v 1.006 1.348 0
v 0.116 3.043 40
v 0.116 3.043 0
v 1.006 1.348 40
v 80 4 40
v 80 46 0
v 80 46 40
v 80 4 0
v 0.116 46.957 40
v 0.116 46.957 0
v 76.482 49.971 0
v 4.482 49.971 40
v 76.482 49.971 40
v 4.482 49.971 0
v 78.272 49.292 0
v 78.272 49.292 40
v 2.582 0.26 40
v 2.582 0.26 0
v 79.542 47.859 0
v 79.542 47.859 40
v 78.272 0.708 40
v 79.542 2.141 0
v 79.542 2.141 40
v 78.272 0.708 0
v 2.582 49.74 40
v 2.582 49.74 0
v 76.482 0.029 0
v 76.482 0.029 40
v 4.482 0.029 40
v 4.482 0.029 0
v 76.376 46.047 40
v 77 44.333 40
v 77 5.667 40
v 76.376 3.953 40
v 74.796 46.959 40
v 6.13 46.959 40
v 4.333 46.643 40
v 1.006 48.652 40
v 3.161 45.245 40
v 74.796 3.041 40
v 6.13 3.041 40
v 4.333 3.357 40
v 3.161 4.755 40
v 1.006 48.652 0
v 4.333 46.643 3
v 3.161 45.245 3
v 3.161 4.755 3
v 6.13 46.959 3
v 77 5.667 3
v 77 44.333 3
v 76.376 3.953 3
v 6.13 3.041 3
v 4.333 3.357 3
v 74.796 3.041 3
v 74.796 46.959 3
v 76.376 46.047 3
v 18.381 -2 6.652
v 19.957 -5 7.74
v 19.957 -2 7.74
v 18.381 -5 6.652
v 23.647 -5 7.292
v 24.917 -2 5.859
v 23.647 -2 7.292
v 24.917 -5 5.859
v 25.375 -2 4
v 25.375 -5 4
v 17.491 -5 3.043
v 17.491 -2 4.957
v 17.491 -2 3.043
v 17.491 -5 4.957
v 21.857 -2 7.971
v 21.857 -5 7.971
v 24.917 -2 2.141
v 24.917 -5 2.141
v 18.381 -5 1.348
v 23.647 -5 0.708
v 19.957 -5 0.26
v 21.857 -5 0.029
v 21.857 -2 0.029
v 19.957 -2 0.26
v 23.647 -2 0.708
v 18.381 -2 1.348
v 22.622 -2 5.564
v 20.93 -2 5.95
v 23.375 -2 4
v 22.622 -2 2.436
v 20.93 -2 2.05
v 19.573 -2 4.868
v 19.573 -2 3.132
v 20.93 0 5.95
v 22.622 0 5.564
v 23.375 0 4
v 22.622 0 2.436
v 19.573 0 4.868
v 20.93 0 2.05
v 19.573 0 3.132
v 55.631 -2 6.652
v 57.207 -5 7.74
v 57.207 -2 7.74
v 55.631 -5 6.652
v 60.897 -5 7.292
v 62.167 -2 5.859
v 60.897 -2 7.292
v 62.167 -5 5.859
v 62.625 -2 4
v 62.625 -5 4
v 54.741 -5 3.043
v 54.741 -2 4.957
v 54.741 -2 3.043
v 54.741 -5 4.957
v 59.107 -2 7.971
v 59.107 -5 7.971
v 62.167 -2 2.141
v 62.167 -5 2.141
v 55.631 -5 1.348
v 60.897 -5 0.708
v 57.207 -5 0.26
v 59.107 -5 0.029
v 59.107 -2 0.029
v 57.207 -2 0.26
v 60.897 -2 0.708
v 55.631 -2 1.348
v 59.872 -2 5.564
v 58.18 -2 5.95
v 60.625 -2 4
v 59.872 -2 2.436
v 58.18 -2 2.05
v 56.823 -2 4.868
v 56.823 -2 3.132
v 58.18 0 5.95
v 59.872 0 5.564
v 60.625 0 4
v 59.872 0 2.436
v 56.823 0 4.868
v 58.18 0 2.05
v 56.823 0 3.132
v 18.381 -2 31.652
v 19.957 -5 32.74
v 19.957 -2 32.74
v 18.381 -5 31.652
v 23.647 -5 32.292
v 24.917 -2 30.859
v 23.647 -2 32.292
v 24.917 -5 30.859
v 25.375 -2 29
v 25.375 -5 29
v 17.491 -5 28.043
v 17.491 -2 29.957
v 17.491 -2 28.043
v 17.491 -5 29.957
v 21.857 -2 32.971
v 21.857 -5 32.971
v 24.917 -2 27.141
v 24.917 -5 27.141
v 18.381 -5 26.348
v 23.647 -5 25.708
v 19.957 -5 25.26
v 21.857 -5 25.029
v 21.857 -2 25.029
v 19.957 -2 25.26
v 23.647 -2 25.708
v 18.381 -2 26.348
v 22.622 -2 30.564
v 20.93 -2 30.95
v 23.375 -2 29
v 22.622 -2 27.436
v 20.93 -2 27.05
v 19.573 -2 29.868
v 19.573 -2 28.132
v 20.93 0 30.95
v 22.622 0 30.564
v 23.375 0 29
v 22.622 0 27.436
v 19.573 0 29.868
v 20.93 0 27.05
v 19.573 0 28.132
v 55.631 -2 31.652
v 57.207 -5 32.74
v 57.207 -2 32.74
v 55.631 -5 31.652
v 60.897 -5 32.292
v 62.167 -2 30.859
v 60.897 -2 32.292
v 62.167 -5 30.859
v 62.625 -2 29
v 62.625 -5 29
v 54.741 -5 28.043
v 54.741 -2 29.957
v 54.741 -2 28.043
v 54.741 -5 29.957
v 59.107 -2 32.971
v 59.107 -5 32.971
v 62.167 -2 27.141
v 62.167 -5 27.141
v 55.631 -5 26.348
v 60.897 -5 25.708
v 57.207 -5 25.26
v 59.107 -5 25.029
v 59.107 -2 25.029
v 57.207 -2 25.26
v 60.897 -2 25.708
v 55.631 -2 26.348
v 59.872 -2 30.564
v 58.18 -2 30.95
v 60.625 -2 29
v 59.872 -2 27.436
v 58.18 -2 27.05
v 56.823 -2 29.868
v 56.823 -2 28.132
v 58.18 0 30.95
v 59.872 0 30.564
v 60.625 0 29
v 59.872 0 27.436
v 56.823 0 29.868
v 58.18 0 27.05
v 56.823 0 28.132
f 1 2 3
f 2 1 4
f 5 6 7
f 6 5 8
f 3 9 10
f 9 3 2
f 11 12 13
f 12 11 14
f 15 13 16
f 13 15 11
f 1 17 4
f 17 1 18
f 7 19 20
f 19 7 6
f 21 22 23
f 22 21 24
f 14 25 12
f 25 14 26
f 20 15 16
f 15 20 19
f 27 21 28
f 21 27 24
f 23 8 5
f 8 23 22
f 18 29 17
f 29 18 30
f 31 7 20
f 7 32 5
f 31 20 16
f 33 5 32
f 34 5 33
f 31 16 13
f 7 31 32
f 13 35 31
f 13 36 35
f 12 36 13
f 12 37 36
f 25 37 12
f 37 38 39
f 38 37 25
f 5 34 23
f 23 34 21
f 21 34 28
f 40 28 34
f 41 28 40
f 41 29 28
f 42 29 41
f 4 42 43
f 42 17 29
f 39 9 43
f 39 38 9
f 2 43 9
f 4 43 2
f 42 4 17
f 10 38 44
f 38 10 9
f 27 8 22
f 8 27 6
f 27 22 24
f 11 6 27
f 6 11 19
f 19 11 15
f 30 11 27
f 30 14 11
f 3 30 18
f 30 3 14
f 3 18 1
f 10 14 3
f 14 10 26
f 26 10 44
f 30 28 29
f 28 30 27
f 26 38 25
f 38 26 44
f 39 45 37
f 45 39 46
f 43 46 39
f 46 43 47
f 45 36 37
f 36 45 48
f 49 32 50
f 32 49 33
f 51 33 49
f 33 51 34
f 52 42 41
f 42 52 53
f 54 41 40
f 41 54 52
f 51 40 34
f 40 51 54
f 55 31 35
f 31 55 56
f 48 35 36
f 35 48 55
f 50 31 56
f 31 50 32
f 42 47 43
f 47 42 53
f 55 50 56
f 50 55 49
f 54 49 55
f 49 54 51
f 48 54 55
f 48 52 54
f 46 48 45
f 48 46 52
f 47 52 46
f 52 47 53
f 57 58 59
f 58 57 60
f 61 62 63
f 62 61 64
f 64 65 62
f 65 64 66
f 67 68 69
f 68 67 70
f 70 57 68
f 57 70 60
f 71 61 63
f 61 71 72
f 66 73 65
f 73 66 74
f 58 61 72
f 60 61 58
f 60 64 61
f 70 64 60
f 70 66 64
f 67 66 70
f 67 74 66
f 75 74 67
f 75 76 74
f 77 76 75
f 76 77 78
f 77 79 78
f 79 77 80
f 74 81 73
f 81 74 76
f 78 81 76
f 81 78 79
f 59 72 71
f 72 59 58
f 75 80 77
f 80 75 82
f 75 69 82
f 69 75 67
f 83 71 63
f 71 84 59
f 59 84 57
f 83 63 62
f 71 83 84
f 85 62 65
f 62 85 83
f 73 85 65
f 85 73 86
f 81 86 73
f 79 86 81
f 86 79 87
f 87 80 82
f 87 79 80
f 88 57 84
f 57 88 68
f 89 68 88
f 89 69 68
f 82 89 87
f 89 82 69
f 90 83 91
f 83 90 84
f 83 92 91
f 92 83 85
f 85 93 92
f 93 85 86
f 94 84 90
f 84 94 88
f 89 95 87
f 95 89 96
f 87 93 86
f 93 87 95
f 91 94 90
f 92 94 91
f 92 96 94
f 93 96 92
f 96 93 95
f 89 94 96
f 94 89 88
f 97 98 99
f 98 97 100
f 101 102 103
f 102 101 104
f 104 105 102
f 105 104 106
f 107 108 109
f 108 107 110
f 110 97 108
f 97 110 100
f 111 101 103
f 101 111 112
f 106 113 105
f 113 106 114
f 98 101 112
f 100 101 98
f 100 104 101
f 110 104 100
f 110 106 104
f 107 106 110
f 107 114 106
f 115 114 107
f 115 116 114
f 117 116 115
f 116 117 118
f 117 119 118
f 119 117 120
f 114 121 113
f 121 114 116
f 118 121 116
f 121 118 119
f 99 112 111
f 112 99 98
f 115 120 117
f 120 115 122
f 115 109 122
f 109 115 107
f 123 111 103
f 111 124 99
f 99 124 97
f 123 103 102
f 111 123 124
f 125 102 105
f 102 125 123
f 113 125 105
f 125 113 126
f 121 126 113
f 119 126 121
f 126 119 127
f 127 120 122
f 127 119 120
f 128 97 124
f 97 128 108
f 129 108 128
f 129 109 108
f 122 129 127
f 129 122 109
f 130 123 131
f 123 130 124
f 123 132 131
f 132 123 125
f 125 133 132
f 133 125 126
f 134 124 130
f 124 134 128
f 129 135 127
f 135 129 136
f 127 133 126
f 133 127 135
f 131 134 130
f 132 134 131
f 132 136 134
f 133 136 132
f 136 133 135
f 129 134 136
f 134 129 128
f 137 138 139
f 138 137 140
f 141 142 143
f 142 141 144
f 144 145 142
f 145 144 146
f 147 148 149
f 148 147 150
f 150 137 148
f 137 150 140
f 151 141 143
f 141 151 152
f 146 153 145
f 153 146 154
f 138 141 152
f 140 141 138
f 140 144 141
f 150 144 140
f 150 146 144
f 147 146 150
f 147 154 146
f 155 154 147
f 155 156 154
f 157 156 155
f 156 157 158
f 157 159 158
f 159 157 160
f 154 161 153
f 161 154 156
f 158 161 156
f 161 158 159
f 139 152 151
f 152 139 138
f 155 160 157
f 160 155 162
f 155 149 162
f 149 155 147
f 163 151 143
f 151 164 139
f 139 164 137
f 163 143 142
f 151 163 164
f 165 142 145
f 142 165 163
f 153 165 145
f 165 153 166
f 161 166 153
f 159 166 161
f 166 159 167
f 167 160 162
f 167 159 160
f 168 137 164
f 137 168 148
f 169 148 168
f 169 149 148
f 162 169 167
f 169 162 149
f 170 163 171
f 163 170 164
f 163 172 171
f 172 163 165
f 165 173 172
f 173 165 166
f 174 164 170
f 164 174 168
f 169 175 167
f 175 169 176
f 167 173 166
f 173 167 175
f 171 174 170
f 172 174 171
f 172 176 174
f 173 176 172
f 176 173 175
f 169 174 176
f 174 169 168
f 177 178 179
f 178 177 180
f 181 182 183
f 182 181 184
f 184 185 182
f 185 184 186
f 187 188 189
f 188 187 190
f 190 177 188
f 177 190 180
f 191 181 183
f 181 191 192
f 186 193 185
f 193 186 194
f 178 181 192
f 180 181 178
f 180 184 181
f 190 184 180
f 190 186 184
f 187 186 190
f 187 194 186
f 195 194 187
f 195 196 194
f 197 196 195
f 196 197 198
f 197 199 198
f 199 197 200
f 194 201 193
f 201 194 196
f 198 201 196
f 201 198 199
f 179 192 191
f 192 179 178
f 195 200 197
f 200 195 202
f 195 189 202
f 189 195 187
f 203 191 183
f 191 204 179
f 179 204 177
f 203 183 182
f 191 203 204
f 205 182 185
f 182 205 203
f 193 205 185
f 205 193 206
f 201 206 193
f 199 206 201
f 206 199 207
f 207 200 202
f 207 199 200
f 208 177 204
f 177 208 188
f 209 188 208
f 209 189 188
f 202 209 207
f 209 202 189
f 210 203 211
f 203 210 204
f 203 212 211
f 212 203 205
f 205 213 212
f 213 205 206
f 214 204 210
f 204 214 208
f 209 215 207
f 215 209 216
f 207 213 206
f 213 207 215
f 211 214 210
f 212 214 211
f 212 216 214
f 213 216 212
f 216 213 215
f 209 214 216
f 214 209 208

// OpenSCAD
// file: modules/module_pegs.scad
module pegs_lux(width,rows)
{
    dia_knob    = 8;
    len_knob    = 3;
    dia_pin     = 4;
    wall        = 2;
    dist        = 37;
    height      = 25;
    
    pegs(dist,height,wall,dia_knob,len_knob,dia_pin,rows);
}

module pegs_hornbach(width,rows)
{
    dia_knob    = 8;
    len_knob    = 3;
    dia_pin     = 4;
    wall        = 2;
    dist        = 45;
    height      = 45;
    
    pegs(dist,height,wall,dia_knob,len_knob,dia_pin);
}

module pegs(dist,height,wall,dia_knob,len_knob,dia_pin,rows)
{
    for(off_y=[0:height:(rows-1)*height])
    {
        translate([dia_knob/2,0,off_y+dia_knob/2])
        {
            for(i=[0:dist:width-dia_knob])
            {
                translate([i+((width-dia_knob)%dist)/2,0,0])
                {
                    peg(wall,dia_knob,len_knob,dia_pin);
                }
            }
        }
    }
}

module peg(wall,dia_knob,len_knob,dia_pin)
{
    rotate([90,0,0])
    {
        translate([0,0,wall])
        {
            cylinder(h=len_knob,d=dia_knob);
        }
        translate([0,0,0])
        {
            cylinder(h=wall,d=dia_pin);
        }
    }
}
// file: modules/module_box.scad
module box(width,depth,height,wall,rounding)
{
    difference()
    {
        cube_round([width,depth,height],mki=rounding);
        translate([wall,wall,wall])
        {
            cube_round([width-2*wall,depth-2*wall,height-wall],mki=2/3*rounding);
        }
    }
}

module cube_round(dim,mki=5,plane="xy"){
    if(mki<=0)
    {
        cube(dim);
    }
    else
    {
        if(plane=="xy")
        {
            translate([mki/2,mki/2,0])
            {
                linear_extrude(dim[2])
                {
                    minkowski()
                    {
                        square([dim[0]-mki,dim[1]-mki]);
                        circle(d=mki);
                    }
                }
            }
        }
        if(plane=="yz")
        {
            translate([0,mki/2,dim[2]-mki/2])
            {
                rotate([0,90,0])
                {
                    linear_extrude(dim[0])
                    {
                        minkowski()
                        {
                            square([dim[2]-mki,dim[1]-mki]);
                            circle(d=mki);
                        }
                    }
                }
            }
        }
        if(plane=="xz")
        {
            translate([mki/2,dim[1],mki/2])
            {
                rotate([90,0,0])
                {
                    linear_extrude(dim[1])
                    {
                        minkowski()
                        {
                            square([dim[0]-mki,dim[2]-mki]);
                            circle(d=mki);
                        }
                    }
                }
            }
        }
    }
}
// main file
include <modules/module_box.scad>
include <modules/module_pegs.scad>

width=80;
depth=50;
height=40;
wall=3;
rounding=8;
rows=2;

box(width,depth,height,wall,rounding);
pegs_lux(width,rows);
